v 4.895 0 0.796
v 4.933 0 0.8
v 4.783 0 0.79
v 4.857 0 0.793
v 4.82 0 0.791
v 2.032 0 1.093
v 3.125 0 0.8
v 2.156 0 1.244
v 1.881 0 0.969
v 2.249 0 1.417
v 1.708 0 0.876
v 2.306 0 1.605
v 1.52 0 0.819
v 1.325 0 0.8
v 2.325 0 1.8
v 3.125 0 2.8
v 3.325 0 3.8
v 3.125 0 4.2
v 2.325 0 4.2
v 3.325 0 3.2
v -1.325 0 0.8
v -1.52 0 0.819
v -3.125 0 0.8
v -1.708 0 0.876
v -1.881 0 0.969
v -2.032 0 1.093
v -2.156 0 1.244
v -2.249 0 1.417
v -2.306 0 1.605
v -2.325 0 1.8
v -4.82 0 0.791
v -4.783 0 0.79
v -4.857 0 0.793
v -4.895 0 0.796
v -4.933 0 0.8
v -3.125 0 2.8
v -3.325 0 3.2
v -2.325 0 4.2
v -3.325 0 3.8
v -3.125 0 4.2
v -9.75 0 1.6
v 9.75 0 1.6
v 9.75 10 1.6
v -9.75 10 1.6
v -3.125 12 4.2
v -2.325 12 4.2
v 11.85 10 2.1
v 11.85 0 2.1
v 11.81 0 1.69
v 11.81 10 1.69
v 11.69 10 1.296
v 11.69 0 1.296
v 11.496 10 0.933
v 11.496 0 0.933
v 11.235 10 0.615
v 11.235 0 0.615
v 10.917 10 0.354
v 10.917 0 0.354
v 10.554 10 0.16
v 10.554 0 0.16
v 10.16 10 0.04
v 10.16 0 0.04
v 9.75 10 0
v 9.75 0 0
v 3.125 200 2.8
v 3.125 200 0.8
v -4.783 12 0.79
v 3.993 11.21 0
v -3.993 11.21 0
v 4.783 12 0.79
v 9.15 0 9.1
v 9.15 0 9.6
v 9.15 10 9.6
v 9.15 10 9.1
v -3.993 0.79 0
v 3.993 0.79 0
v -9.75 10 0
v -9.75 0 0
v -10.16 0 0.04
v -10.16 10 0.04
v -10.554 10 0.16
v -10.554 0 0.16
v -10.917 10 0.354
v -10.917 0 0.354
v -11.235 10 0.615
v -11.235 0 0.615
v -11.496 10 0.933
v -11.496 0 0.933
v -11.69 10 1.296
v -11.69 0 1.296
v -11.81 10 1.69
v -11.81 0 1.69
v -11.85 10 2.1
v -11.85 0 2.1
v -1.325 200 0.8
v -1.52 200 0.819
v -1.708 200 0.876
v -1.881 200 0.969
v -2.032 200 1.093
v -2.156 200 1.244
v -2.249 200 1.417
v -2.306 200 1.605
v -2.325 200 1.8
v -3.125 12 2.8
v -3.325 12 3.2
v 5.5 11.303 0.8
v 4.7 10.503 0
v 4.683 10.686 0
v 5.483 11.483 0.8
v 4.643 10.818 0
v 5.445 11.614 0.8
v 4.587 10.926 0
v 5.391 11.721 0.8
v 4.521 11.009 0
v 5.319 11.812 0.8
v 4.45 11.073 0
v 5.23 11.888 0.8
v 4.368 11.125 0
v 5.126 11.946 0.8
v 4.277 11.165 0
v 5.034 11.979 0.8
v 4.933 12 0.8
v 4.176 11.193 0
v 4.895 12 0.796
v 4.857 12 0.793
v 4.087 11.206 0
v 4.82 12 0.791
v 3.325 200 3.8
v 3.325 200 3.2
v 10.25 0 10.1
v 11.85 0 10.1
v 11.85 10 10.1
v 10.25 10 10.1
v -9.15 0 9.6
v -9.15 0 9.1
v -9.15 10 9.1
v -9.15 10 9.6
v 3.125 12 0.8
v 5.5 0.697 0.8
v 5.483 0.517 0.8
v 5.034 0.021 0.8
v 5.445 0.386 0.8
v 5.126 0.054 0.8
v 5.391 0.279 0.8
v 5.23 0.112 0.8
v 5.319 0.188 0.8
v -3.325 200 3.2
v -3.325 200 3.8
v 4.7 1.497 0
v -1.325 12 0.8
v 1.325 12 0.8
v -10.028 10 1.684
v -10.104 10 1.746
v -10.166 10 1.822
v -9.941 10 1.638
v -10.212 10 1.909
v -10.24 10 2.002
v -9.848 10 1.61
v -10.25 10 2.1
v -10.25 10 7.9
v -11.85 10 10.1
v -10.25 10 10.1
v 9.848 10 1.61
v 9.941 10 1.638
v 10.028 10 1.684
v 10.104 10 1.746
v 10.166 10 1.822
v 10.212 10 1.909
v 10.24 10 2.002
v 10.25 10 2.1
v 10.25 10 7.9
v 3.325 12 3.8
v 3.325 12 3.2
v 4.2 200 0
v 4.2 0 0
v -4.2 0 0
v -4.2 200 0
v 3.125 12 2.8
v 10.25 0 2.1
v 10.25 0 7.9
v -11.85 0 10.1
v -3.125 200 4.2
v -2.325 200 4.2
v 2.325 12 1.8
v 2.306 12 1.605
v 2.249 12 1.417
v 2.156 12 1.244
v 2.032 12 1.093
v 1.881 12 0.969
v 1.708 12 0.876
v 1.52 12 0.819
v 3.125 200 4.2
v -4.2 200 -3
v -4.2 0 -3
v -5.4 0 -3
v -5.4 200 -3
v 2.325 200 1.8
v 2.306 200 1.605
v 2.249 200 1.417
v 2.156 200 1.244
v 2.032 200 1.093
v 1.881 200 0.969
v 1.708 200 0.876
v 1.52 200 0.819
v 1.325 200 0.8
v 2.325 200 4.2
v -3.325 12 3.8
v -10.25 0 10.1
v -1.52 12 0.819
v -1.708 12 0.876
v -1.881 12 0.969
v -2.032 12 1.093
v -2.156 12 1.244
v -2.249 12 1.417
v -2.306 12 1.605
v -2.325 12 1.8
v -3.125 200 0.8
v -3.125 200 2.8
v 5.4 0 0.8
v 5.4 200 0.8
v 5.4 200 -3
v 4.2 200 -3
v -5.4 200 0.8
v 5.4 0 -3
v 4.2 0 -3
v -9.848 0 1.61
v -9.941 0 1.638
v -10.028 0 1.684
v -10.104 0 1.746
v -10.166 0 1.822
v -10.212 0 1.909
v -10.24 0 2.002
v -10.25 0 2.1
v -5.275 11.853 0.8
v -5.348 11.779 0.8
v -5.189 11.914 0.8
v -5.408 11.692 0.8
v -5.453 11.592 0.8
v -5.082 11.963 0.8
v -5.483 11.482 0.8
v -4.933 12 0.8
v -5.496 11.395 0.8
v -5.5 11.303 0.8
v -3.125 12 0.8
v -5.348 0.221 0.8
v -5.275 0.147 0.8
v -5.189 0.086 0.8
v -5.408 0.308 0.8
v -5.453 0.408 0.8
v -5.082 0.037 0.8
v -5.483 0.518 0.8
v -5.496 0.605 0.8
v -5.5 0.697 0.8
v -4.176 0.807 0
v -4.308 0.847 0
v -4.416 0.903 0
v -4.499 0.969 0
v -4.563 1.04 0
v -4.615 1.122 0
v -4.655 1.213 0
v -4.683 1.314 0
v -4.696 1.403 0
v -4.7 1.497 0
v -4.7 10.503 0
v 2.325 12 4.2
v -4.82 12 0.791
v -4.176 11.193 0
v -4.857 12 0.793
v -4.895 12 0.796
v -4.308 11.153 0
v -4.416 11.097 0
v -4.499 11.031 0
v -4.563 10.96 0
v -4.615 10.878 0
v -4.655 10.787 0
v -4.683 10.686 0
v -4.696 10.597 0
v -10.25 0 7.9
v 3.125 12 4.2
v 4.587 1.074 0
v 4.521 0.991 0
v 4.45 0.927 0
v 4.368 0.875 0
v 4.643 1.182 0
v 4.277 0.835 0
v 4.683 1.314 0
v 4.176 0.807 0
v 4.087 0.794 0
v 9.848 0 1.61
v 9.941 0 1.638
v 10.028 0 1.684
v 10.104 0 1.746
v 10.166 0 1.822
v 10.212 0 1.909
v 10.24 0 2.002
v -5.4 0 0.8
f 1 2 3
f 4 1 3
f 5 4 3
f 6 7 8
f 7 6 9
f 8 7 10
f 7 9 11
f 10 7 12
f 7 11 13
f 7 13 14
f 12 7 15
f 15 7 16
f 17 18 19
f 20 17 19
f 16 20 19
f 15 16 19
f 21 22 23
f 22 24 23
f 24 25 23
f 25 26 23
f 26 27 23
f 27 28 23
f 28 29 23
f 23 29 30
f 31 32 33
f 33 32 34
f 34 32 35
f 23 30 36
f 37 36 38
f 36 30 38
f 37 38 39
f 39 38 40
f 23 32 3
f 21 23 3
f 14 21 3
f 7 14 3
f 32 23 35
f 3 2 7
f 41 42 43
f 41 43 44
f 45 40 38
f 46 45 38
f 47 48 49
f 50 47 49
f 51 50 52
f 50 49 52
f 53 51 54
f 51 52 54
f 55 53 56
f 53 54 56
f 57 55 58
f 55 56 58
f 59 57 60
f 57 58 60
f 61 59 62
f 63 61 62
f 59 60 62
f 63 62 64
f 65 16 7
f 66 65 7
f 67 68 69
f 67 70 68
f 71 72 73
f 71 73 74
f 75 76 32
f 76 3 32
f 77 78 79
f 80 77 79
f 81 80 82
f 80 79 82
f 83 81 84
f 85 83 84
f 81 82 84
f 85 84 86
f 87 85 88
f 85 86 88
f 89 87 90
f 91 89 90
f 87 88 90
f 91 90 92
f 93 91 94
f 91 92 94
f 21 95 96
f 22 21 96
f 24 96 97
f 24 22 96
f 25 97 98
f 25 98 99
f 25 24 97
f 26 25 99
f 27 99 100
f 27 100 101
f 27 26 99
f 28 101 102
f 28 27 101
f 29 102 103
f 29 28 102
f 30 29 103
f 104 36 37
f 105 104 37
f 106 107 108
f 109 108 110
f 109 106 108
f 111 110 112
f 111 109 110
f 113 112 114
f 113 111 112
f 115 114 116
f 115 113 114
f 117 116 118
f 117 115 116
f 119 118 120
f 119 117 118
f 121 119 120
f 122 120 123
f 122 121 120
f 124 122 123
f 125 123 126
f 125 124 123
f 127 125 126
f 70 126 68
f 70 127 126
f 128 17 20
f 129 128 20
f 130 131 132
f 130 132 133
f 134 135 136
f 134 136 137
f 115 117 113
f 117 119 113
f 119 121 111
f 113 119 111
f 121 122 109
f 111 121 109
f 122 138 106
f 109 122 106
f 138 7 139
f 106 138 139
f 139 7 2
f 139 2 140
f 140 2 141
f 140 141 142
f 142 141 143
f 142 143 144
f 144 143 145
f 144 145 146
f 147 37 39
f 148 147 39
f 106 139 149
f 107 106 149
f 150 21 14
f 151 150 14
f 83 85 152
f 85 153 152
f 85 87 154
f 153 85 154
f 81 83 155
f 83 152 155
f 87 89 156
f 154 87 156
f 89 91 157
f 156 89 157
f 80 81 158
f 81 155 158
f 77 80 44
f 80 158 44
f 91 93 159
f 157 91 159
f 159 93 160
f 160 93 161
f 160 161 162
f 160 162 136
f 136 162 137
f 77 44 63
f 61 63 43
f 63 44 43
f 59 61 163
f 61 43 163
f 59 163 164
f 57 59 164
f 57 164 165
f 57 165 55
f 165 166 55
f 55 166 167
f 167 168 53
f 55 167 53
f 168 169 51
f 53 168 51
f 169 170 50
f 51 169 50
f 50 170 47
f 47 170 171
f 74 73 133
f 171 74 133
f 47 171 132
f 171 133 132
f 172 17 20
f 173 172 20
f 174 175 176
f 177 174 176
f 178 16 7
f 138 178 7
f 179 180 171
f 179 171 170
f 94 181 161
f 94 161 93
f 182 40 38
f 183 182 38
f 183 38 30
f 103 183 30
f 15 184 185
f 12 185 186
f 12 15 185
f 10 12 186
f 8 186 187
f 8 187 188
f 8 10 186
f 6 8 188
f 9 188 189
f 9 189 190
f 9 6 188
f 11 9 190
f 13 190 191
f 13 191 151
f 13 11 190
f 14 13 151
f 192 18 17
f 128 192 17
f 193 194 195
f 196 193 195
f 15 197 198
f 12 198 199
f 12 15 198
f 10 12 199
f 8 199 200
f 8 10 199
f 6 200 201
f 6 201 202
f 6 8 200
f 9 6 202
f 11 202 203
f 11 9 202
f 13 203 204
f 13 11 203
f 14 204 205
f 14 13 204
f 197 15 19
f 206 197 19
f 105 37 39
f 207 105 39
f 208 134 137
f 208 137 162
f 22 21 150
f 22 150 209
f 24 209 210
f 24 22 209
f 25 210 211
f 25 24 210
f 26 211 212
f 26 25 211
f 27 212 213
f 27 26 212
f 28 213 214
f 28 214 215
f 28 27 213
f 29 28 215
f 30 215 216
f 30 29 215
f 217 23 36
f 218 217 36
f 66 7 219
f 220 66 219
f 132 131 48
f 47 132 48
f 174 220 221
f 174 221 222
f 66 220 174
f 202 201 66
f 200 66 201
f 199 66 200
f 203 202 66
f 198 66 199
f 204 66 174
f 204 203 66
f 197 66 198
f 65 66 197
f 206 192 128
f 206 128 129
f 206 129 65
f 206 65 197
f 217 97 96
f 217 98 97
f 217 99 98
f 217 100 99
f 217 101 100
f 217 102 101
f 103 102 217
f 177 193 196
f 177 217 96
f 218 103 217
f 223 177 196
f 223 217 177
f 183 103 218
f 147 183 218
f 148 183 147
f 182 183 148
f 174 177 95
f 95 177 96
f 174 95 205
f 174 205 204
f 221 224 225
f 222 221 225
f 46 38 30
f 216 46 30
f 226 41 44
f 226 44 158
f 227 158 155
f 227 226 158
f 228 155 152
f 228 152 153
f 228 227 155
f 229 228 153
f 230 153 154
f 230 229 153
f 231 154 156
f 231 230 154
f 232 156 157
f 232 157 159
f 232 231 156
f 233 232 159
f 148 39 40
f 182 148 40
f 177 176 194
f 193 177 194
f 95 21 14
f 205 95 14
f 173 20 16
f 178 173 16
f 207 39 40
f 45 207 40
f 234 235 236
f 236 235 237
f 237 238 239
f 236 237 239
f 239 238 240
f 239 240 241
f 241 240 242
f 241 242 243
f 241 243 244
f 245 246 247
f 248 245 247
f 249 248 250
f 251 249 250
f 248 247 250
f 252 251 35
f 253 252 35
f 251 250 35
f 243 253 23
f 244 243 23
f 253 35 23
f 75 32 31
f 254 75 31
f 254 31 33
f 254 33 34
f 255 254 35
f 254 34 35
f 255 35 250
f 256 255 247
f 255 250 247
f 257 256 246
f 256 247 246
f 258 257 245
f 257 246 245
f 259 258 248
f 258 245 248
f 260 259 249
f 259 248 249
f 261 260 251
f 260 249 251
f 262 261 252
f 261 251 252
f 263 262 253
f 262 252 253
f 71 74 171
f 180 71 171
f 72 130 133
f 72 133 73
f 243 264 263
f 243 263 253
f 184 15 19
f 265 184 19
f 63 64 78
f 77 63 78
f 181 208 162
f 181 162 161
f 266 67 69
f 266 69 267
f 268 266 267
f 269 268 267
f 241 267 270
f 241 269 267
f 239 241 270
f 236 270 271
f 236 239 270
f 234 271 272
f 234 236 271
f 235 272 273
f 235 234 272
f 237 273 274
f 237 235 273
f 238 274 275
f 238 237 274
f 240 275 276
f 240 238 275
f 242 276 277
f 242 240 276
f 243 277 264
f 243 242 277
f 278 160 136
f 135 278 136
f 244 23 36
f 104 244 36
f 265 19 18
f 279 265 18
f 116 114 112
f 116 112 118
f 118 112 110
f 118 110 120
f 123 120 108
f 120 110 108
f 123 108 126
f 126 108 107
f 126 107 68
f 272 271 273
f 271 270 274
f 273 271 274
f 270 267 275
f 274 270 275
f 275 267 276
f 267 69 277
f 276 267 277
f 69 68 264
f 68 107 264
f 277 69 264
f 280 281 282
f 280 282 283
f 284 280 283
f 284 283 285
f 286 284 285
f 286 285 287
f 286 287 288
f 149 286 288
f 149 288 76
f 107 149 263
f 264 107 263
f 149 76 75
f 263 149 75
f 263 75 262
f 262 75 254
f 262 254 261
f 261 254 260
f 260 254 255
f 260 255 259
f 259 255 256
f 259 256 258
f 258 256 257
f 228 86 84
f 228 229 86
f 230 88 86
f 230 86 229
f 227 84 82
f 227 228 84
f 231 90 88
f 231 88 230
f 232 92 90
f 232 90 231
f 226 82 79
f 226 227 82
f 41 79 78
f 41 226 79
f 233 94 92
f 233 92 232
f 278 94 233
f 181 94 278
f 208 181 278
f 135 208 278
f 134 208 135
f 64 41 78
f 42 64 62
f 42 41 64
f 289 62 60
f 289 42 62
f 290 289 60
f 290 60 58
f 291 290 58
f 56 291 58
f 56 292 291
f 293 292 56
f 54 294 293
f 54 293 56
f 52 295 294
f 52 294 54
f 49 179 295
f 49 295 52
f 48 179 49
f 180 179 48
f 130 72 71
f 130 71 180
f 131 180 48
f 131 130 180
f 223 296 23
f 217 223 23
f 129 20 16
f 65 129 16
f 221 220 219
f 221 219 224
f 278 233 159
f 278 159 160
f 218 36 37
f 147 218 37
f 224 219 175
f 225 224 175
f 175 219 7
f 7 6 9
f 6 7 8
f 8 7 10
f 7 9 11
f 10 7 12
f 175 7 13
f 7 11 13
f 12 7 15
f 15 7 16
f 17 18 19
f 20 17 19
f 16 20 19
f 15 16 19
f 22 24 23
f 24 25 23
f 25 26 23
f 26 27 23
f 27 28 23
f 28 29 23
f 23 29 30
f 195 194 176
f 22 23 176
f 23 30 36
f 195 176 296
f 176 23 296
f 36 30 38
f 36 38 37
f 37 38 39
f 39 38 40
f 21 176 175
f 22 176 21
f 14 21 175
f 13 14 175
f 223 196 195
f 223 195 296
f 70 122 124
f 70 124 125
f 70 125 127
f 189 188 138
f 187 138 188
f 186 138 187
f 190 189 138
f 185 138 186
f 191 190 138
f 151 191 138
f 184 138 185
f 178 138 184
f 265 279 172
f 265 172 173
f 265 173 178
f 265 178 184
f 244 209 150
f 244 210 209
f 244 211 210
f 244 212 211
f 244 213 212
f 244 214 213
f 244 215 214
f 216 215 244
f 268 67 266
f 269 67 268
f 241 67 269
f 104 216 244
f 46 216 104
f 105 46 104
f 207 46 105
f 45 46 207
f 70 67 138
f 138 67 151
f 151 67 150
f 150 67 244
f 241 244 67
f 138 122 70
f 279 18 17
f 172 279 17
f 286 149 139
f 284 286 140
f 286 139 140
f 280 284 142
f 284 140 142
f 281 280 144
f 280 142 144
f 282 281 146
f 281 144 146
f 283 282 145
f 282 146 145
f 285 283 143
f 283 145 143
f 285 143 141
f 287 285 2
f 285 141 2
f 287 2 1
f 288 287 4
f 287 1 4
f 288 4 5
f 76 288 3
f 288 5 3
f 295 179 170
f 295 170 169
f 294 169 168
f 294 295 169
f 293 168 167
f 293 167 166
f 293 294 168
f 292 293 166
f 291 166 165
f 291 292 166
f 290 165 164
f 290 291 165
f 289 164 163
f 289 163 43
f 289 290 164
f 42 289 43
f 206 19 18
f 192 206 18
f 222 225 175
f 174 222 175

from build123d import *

# Parameters (mm, degrees)
PAD_DEPTH    = 12
CHAMFER_SIZE = 0.79
FILLET_R     = 1
PAD001_DEPTH = 200
PAD002_DEPTH = 10


with BuildPart() as plug:
    # Sketch003 → Pad (new body)
    with BuildSketch(Plane(origin=(0, 0, 0), x_dir=(-1, 0, 0), z_dir=(0, 1, 0))):
        with BuildLine():
            Line((-4.7, 0), (4.7, 0))
            Line((4.7, 0), (5.5, 0.8))
            Line((5.5, 0.8), (3.125, 0.8))
            Line((3.125, 0.8), (3.125, 2.8))
            Line((3.125, 2.8), (3.325, 3.2))
            Line((3.325, 3.2), (3.325, 3.8))
            Line((3.325, 3.8), (3.125, 4.2))
            Line((3.125, 4.2), (2.325, 4.2))
            Line((2.325, 4.2), (2.325, 1.8))
            ThreePointArc((1.325, 0.8), (2.032107, 1.092893), (2.325, 1.8))
            Line((1.325, 0.8), (-1.325, 0.8))
            ThreePointArc((-2.325, 1.8), (-2.032107, 1.092893), (-1.325, 0.8))
            Line((-2.325, 1.8), (-2.325, 4.2))
            Line((-2.325, 4.2), (-3.125, 4.2))
            Line((-3.125, 4.2), (-3.325, 3.8))
            Line((-3.325, 3.8), (-3.325, 3.2))
            Line((-3.325, 3.2), (-3.125, 2.8))
            Line((-3.125, 2.8), (-3.125, 0.8))
            Line((-3.125, 0.8), (-5.5, 0.8))
            Line((-5.5, 0.8), (-4.7, 0))
        make_face()
    extrude(amount=PAD_DEPTH)

    # Chamfer
    chamfer_edges = [plug.edges().sort_by_distance(p)[0] for p in [
        (0, 12, 0),
        (0, 0, 0),
    ]]
    chamfer(chamfer_edges, length=CHAMFER_SIZE)

    # Fillet
    fillet_edges = [plug.edges().sort_by_distance(p)[0] for p in [
        (5.095, 11.605, 0.395),
        (5.095, 0.395, 0.395),
        (-5.095, 11.605, 0.395),
        (-5.095, 0.395, 0.395),
    ]]
    fillet(fillet_edges, radius=FILLET_R)


with BuildPart() as ledclipbody:
    # Sketch001 → Pad001 (new body)
    with BuildSketch(Plane(origin=(0, 0, 0), x_dir=(-1, 0, 0), z_dir=(0, 1, 0))):
        with BuildLine():
            Line((5.4, 0.8), (3.125, 0.8))
            Line((3.125, 0.8), (3.125, 2.8))
            Line((3.125, 2.8), (3.325, 3.2))
            Line((3.325, 3.2), (3.325, 3.8))
            Line((3.325, 3.8), (3.125, 4.2))
            Line((3.125, 4.2), (2.325, 4.2))
            Line((2.325, 4.2), (2.325, 1.8))
            ThreePointArc((1.325, 0.8), (2.032107, 1.092893), (2.325, 1.8))
            Line((1.325, 0.8), (-1.325, 0.8))
            ThreePointArc((-2.325, 1.8), (-2.032107, 1.092893), (-1.325, 0.8))
            Line((-2.325, 1.8), (-2.325, 4.2))
            Line((-2.325, 4.2), (-3.125, 4.2))
            Line((-3.125, 4.2), (-3.325, 3.8))
            Line((-3.325, 3.8), (-3.325, 3.2))
            Line((-3.325, 3.2), (-3.125, 2.8))
            Line((-3.125, 2.8), (-3.125, 0.8))
            Line((-3.125, 0.8), (-5.4, 0.8))
            Line((-5.4, 0.8), (-5.4, -3))
            Line((-5.4, -3), (-4.2, -3))
            Line((-4.2, -3), (-4.2, 0))
            Line((-4.2, 0), (4.2, 0))
            Line((4.2, 0), (4.2, -3))
            Line((4.2, -3), (5.4, -3))
            Line((5.4, -3), (5.4, 0.8))
        make_face()
    extrude(amount=PAD001_DEPTH)


with BuildPart() as pad002body:
    # Sketch002 → Pad002 (new body)
    with BuildSketch(Plane(origin=(0, 0, 0), x_dir=(-1, 0, 0), z_dir=(0, 1, 0))):
        with BuildLine():
            Line((-10.25, 10.1), (-9.15, 9.6))
            Line((-9.15, 9.6), (-9.15, 9.1))
            Line((-9.15, 9.1), (-10.25, 7.9))
            Line((-10.25, 7.9), (-10.25, 2.1))
            ThreePointArc((-10.25, 2.1), (-10.103553, 1.746447), (-9.75, 1.6))
            Line((-9.75, 1.6), (9.75, 1.6))
            ThreePointArc((9.75, 1.6), (10.103553, 1.746447), (10.25, 2.1))
            Line((10.25, 2.1), (10.25, 7.9))
            Line((10.25, 7.9), (9.15, 9.1))
            Line((9.15, 9.1), (9.15, 9.6))
            Line((9.15, 9.6), (10.25, 10.1))
            Line((10.25, 10.1), (11.85, 10.1))
            Line((11.85, 10.1), (11.85, 2.1))
            ThreePointArc((9.75, 0), (11.234924, 0.615076), (11.85, 2.1))
            Line((-9.75, 0), (9.75, 0))
            ThreePointArc((-11.85, 2.1), (-11.234924, 0.615076), (-9.75, 0))
            Line((-11.85, 10.1), (-11.85, 2.1))
            Line((-11.85, 10.1), (-10.25, 10.1))
        make_face()
    extrude(amount=PAD002_DEPTH)


solid = Compound([plug.part, ledclipbody.part, pad002body.part])
